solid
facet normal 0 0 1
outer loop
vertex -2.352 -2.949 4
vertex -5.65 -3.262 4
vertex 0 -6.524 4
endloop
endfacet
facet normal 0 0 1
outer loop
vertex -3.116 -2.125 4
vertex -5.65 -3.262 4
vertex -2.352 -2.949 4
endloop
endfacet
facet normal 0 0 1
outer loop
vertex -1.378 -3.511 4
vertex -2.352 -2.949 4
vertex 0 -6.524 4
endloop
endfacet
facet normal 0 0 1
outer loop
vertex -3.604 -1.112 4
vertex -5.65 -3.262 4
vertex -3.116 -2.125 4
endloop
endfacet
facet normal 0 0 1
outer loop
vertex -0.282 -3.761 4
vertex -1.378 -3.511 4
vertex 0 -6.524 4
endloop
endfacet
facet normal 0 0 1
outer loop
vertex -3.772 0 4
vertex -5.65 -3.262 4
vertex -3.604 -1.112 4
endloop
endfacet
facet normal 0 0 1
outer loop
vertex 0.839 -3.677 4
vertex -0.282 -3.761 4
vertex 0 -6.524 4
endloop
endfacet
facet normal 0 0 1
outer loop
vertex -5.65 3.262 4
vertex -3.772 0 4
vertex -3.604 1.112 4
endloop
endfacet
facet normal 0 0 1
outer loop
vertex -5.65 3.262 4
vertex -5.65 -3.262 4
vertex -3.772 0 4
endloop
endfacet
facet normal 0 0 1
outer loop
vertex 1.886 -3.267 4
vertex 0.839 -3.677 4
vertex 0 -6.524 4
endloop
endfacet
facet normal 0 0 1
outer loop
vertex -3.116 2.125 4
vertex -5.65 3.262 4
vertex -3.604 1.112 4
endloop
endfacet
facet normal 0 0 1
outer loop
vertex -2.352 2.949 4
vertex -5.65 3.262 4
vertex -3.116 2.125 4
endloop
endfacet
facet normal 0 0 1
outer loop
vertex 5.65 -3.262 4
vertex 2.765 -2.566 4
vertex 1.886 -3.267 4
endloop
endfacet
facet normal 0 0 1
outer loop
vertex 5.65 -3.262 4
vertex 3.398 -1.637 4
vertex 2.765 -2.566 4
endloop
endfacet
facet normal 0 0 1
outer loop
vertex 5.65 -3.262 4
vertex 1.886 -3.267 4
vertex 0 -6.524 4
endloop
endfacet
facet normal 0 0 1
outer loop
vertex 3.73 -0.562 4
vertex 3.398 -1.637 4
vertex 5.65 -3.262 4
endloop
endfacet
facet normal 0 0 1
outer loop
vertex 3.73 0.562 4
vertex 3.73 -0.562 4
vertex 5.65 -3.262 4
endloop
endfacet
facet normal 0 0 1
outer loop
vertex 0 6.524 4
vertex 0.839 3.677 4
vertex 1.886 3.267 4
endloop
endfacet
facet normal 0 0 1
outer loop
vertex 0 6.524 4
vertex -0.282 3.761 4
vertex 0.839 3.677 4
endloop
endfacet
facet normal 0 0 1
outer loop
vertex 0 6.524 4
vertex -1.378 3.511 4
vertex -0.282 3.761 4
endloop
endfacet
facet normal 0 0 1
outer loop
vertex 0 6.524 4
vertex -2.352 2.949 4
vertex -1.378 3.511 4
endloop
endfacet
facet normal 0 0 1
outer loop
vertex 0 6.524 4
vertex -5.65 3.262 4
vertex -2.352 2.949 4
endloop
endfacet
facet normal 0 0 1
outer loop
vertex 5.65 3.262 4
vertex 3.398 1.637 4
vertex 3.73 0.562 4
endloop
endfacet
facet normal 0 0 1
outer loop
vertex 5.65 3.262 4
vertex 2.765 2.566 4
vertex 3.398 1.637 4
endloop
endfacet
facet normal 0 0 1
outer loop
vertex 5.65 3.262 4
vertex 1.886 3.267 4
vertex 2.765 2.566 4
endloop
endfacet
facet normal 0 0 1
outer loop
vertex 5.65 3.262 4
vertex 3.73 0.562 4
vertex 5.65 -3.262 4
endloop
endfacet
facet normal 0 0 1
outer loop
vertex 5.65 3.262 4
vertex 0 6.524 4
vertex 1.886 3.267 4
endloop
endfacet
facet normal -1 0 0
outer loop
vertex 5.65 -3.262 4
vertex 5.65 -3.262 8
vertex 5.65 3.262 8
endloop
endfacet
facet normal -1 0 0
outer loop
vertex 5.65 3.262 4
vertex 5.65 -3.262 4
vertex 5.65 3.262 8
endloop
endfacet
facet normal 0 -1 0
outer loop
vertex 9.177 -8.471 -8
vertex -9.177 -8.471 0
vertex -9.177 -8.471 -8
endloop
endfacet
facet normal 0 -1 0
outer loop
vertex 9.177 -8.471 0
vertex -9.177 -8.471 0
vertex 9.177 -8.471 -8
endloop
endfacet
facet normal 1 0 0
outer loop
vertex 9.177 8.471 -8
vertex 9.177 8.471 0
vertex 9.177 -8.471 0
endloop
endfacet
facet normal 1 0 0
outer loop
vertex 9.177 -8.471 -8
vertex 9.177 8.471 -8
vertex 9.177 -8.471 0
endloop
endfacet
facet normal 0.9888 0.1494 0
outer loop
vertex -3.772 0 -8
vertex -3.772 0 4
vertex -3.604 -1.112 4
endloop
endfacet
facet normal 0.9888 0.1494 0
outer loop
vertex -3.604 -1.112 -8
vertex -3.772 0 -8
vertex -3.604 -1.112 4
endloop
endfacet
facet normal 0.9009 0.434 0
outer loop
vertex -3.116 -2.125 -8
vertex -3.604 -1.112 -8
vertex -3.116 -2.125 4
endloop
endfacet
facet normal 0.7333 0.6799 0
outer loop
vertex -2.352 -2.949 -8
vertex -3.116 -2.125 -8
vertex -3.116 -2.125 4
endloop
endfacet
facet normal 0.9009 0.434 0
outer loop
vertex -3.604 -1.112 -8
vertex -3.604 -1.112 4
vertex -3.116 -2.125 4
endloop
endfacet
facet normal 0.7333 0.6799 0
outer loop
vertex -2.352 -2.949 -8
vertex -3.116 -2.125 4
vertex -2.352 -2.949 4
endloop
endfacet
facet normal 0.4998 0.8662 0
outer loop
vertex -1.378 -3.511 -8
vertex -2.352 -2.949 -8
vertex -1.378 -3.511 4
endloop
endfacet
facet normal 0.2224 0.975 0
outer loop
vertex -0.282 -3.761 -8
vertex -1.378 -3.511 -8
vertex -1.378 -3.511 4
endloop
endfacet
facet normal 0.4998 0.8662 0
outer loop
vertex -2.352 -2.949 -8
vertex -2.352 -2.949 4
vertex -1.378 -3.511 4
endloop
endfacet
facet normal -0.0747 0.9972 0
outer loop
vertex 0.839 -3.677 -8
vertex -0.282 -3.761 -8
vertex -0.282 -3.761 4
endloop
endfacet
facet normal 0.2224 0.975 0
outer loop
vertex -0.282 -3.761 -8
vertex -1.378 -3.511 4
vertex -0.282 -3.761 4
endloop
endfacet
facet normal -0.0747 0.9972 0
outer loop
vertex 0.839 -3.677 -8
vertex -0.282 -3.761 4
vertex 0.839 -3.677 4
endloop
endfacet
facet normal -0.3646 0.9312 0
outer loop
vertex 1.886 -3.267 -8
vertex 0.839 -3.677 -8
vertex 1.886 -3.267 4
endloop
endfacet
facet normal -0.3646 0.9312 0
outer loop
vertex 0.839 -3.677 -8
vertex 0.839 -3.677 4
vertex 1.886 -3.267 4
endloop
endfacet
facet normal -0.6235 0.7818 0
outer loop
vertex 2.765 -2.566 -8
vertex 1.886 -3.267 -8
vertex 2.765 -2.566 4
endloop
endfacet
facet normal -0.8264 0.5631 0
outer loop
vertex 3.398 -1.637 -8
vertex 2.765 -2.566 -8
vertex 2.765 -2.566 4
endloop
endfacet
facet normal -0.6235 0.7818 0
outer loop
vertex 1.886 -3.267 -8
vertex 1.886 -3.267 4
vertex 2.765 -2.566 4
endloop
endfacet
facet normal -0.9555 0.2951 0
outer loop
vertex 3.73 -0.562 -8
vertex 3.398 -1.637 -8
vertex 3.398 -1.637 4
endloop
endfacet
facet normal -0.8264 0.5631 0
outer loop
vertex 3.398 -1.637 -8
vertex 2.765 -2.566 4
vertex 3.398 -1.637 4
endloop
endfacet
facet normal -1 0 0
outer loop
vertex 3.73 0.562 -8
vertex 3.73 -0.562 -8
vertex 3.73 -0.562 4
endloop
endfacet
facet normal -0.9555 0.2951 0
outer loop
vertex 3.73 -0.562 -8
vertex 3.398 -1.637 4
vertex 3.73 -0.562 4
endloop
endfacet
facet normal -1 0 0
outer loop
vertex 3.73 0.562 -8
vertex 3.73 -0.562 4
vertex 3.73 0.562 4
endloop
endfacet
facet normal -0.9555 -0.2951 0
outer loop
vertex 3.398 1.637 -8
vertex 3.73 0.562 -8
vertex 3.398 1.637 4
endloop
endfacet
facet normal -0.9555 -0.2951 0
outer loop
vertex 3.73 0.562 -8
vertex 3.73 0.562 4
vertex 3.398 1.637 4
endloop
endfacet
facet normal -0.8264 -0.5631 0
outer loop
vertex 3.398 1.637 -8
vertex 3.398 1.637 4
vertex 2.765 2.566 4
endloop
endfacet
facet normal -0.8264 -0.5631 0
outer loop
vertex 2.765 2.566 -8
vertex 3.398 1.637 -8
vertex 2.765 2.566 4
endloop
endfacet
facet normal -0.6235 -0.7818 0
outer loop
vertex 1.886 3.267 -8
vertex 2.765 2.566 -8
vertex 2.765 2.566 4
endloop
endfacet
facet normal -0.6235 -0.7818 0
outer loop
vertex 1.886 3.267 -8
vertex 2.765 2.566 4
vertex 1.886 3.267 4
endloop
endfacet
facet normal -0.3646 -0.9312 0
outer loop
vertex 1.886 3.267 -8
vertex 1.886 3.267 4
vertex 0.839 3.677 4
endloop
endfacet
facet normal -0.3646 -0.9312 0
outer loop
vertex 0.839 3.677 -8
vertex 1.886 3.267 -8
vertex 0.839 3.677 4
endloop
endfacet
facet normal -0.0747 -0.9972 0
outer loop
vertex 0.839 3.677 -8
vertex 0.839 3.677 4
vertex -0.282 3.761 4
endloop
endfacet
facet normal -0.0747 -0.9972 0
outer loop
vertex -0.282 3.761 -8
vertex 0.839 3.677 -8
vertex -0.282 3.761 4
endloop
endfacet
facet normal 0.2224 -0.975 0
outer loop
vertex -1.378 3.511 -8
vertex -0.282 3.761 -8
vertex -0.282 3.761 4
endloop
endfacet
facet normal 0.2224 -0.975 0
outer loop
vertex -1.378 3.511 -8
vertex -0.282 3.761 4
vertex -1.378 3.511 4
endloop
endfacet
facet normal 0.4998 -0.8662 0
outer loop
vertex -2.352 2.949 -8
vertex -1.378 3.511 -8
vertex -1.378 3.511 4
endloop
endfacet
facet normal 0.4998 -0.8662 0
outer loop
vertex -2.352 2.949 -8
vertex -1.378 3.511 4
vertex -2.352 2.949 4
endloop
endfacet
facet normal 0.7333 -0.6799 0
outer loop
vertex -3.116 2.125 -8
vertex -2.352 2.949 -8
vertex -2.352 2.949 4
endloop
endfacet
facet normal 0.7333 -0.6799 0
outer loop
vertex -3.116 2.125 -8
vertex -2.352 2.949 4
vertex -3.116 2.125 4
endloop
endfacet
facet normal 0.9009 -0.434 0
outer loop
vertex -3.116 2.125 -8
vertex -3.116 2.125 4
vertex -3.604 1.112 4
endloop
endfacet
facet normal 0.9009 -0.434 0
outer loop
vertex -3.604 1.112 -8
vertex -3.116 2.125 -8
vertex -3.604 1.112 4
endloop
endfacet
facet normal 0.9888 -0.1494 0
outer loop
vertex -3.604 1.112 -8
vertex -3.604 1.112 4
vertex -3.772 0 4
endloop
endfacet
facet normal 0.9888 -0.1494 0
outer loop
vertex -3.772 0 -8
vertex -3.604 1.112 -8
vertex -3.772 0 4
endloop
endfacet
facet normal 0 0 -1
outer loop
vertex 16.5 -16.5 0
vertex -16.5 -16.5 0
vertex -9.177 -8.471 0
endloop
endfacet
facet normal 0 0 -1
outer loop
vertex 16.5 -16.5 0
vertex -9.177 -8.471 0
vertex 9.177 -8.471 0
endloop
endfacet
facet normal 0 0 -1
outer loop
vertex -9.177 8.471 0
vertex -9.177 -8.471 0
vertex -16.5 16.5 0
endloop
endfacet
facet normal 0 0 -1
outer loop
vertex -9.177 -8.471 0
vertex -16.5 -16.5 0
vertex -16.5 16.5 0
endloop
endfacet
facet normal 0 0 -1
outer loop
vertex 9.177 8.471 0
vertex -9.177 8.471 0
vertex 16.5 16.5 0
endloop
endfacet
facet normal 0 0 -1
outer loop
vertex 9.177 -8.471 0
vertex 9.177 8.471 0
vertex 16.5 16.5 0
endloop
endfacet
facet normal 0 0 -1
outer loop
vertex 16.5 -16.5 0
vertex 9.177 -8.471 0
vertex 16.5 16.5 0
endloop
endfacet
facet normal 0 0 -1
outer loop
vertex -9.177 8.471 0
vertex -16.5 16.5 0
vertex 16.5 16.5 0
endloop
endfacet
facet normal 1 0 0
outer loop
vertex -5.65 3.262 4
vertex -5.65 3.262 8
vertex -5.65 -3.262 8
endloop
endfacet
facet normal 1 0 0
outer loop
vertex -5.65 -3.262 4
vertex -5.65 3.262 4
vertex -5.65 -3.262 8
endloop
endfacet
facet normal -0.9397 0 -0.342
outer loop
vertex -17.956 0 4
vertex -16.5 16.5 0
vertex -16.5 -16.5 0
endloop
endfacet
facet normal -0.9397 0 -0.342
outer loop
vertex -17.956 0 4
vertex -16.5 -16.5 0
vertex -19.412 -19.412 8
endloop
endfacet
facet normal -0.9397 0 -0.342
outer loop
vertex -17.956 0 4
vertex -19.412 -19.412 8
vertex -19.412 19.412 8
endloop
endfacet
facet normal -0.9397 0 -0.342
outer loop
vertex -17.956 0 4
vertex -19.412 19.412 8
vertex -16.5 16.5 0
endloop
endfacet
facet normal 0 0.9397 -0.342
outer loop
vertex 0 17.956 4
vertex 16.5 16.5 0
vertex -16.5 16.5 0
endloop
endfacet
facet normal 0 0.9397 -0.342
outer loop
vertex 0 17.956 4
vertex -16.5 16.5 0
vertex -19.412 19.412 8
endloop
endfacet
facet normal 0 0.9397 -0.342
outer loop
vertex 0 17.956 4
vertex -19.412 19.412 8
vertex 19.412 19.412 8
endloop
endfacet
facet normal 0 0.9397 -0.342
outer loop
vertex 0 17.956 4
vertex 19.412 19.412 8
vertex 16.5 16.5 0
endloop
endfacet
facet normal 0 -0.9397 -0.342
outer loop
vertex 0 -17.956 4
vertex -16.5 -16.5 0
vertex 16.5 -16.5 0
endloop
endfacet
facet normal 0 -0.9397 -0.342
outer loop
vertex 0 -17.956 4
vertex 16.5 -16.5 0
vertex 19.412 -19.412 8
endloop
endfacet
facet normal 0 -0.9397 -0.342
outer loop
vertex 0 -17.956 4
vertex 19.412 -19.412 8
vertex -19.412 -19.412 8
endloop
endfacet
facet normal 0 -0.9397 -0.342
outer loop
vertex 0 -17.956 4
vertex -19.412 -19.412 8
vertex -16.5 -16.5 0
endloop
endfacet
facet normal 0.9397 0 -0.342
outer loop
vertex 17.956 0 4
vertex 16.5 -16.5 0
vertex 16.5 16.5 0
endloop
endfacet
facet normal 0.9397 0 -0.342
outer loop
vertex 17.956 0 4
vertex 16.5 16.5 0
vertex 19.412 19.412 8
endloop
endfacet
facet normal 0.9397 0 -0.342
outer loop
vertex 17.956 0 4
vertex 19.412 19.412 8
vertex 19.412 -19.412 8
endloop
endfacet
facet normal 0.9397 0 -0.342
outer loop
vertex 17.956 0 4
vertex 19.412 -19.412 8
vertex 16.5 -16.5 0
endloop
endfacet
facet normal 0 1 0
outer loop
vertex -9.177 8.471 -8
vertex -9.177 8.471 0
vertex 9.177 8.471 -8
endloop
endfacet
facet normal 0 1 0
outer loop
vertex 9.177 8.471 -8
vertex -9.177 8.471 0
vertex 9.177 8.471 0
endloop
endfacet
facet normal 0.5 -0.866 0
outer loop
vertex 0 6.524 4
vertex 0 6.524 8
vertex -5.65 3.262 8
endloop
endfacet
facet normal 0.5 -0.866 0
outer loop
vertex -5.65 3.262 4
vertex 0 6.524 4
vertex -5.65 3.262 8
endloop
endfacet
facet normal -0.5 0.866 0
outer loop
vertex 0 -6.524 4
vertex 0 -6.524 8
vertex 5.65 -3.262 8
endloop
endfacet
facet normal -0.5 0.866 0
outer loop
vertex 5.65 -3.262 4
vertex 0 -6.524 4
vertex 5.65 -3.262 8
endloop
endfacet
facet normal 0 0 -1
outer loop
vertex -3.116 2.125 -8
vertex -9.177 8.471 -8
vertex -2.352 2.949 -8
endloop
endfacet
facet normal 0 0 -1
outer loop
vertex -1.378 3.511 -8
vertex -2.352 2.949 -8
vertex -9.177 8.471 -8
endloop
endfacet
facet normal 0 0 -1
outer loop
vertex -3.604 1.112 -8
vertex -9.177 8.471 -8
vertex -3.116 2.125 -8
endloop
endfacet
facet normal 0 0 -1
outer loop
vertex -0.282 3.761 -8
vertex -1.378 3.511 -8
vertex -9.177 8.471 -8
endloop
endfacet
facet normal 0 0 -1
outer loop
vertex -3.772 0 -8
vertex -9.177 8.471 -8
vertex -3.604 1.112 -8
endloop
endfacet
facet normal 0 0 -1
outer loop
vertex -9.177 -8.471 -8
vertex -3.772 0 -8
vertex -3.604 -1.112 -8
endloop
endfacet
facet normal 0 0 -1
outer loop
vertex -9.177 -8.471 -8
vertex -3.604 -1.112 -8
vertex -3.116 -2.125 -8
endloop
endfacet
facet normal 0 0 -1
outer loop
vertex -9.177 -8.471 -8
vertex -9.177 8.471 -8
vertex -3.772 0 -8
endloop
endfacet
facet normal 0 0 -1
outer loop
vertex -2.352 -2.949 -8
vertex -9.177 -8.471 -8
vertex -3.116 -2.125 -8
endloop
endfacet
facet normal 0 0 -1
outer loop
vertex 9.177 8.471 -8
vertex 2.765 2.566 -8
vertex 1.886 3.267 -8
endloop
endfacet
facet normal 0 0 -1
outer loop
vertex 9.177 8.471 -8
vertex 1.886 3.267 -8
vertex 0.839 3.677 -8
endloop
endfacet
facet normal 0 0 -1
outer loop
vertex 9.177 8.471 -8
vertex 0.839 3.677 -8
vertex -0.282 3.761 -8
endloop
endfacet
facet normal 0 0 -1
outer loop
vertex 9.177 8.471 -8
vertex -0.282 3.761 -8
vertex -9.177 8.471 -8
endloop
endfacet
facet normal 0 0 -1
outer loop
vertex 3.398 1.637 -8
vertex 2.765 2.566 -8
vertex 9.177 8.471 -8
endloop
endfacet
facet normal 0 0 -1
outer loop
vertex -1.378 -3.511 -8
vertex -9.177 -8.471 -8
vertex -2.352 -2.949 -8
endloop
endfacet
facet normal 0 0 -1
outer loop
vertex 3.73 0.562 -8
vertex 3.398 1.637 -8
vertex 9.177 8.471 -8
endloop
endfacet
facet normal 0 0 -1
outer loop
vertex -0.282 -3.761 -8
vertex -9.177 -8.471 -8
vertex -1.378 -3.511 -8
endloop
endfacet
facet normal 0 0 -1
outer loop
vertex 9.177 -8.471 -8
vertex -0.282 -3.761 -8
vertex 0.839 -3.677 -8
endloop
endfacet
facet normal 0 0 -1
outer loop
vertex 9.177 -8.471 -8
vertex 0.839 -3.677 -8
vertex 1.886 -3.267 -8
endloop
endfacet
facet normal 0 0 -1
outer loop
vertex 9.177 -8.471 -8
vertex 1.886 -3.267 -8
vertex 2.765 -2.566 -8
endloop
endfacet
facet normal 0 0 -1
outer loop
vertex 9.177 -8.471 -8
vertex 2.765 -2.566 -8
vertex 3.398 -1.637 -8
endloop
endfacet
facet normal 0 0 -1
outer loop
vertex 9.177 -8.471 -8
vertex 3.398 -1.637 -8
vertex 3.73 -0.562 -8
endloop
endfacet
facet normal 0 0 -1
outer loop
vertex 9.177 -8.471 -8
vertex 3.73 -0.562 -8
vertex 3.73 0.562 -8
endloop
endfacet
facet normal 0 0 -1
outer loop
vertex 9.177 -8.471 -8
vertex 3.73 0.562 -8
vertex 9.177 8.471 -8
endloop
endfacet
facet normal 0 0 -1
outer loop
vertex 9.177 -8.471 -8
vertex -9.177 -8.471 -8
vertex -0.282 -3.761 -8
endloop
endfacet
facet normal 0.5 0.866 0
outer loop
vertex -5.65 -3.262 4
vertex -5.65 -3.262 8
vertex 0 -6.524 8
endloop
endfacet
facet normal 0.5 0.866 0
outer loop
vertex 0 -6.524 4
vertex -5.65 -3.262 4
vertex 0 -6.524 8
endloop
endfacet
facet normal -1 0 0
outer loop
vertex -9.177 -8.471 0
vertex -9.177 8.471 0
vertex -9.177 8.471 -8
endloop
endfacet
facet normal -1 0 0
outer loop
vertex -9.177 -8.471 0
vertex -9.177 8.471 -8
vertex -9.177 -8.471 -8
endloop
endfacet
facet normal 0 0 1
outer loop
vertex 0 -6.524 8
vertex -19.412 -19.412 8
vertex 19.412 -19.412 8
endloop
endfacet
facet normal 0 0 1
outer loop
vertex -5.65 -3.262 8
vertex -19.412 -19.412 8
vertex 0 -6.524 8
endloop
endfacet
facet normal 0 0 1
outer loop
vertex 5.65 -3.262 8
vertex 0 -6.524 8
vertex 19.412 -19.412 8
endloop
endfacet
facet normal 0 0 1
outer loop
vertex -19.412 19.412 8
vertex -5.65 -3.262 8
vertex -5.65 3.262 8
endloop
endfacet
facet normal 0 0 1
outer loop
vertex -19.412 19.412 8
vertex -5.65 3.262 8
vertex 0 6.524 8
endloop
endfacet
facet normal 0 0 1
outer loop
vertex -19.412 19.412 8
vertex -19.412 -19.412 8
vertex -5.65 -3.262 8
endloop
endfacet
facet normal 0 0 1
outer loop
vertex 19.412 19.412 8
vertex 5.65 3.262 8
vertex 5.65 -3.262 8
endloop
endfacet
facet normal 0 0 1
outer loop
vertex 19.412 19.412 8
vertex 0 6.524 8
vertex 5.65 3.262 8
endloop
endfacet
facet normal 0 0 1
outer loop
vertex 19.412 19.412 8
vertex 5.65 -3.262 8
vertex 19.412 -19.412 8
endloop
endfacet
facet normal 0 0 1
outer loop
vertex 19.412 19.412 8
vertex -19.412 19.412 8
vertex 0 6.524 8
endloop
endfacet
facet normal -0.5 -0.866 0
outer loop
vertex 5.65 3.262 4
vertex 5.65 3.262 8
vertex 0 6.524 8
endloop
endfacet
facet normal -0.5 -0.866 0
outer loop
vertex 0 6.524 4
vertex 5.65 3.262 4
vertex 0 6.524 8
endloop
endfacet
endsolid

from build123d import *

# Parameters (mm, degrees)
F0_W     = 33
F0_H     = 33
F1_DEPTH = 8
F1_TAPER = -20
F3_DEPTH = 4
F4_W     = 18.3548238128
F4_H     = 16.941415146
F5_DEPTH = 8
F7_D     = 7.5438
F7_DEPTH = 25
F7_TIP   = 2.2663861689


with BuildPart() as f1:
    # F0 (on Top) → F1 (new body)
    with BuildSketch(Plane.XY):
        Rectangle(F0_W, F0_H)
    extrude(amount=F1_DEPTH, taper=F1_TAPER)

    # F2 (on face) → F3 (cut)
    with BuildSketch(Plane.XY.offset(8)):
        Polygon((5.65, -3.2620290209), (5.65, 3.2620290209), (0, 6.5240580418), (-5.65, 3.2620290209), (-5.65, -3.2620290209), (0, -6.5240580418), align=None)
    extrude(amount=-F3_DEPTH, mode=Mode.SUBTRACT)

    # F4 (on face) → F5 (join)
    with BuildSketch(Plane(origin=(0, 0, 0), x_dir=(1, 0, 0), z_dir=(0, 0, -1))):
        Rectangle(F4_W, F4_H)
    extrude(amount=F5_DEPTH)

    # F7
    with Locations(Plane(origin=(0, 0, -8), x_dir=(1, 0, 0), z_dir=(0, 0, -1))):
        with Locations((0, 0)):
            Hole(F7_D / 2, depth=F7_DEPTH)
            with Locations((0, 0, -(F7_DEPTH + F7_TIP / 2))):  # 118° drill point
                Cone(0, F7_D / 2, F7_TIP, mode=Mode.SUBTRACT)


solid = f1.part
